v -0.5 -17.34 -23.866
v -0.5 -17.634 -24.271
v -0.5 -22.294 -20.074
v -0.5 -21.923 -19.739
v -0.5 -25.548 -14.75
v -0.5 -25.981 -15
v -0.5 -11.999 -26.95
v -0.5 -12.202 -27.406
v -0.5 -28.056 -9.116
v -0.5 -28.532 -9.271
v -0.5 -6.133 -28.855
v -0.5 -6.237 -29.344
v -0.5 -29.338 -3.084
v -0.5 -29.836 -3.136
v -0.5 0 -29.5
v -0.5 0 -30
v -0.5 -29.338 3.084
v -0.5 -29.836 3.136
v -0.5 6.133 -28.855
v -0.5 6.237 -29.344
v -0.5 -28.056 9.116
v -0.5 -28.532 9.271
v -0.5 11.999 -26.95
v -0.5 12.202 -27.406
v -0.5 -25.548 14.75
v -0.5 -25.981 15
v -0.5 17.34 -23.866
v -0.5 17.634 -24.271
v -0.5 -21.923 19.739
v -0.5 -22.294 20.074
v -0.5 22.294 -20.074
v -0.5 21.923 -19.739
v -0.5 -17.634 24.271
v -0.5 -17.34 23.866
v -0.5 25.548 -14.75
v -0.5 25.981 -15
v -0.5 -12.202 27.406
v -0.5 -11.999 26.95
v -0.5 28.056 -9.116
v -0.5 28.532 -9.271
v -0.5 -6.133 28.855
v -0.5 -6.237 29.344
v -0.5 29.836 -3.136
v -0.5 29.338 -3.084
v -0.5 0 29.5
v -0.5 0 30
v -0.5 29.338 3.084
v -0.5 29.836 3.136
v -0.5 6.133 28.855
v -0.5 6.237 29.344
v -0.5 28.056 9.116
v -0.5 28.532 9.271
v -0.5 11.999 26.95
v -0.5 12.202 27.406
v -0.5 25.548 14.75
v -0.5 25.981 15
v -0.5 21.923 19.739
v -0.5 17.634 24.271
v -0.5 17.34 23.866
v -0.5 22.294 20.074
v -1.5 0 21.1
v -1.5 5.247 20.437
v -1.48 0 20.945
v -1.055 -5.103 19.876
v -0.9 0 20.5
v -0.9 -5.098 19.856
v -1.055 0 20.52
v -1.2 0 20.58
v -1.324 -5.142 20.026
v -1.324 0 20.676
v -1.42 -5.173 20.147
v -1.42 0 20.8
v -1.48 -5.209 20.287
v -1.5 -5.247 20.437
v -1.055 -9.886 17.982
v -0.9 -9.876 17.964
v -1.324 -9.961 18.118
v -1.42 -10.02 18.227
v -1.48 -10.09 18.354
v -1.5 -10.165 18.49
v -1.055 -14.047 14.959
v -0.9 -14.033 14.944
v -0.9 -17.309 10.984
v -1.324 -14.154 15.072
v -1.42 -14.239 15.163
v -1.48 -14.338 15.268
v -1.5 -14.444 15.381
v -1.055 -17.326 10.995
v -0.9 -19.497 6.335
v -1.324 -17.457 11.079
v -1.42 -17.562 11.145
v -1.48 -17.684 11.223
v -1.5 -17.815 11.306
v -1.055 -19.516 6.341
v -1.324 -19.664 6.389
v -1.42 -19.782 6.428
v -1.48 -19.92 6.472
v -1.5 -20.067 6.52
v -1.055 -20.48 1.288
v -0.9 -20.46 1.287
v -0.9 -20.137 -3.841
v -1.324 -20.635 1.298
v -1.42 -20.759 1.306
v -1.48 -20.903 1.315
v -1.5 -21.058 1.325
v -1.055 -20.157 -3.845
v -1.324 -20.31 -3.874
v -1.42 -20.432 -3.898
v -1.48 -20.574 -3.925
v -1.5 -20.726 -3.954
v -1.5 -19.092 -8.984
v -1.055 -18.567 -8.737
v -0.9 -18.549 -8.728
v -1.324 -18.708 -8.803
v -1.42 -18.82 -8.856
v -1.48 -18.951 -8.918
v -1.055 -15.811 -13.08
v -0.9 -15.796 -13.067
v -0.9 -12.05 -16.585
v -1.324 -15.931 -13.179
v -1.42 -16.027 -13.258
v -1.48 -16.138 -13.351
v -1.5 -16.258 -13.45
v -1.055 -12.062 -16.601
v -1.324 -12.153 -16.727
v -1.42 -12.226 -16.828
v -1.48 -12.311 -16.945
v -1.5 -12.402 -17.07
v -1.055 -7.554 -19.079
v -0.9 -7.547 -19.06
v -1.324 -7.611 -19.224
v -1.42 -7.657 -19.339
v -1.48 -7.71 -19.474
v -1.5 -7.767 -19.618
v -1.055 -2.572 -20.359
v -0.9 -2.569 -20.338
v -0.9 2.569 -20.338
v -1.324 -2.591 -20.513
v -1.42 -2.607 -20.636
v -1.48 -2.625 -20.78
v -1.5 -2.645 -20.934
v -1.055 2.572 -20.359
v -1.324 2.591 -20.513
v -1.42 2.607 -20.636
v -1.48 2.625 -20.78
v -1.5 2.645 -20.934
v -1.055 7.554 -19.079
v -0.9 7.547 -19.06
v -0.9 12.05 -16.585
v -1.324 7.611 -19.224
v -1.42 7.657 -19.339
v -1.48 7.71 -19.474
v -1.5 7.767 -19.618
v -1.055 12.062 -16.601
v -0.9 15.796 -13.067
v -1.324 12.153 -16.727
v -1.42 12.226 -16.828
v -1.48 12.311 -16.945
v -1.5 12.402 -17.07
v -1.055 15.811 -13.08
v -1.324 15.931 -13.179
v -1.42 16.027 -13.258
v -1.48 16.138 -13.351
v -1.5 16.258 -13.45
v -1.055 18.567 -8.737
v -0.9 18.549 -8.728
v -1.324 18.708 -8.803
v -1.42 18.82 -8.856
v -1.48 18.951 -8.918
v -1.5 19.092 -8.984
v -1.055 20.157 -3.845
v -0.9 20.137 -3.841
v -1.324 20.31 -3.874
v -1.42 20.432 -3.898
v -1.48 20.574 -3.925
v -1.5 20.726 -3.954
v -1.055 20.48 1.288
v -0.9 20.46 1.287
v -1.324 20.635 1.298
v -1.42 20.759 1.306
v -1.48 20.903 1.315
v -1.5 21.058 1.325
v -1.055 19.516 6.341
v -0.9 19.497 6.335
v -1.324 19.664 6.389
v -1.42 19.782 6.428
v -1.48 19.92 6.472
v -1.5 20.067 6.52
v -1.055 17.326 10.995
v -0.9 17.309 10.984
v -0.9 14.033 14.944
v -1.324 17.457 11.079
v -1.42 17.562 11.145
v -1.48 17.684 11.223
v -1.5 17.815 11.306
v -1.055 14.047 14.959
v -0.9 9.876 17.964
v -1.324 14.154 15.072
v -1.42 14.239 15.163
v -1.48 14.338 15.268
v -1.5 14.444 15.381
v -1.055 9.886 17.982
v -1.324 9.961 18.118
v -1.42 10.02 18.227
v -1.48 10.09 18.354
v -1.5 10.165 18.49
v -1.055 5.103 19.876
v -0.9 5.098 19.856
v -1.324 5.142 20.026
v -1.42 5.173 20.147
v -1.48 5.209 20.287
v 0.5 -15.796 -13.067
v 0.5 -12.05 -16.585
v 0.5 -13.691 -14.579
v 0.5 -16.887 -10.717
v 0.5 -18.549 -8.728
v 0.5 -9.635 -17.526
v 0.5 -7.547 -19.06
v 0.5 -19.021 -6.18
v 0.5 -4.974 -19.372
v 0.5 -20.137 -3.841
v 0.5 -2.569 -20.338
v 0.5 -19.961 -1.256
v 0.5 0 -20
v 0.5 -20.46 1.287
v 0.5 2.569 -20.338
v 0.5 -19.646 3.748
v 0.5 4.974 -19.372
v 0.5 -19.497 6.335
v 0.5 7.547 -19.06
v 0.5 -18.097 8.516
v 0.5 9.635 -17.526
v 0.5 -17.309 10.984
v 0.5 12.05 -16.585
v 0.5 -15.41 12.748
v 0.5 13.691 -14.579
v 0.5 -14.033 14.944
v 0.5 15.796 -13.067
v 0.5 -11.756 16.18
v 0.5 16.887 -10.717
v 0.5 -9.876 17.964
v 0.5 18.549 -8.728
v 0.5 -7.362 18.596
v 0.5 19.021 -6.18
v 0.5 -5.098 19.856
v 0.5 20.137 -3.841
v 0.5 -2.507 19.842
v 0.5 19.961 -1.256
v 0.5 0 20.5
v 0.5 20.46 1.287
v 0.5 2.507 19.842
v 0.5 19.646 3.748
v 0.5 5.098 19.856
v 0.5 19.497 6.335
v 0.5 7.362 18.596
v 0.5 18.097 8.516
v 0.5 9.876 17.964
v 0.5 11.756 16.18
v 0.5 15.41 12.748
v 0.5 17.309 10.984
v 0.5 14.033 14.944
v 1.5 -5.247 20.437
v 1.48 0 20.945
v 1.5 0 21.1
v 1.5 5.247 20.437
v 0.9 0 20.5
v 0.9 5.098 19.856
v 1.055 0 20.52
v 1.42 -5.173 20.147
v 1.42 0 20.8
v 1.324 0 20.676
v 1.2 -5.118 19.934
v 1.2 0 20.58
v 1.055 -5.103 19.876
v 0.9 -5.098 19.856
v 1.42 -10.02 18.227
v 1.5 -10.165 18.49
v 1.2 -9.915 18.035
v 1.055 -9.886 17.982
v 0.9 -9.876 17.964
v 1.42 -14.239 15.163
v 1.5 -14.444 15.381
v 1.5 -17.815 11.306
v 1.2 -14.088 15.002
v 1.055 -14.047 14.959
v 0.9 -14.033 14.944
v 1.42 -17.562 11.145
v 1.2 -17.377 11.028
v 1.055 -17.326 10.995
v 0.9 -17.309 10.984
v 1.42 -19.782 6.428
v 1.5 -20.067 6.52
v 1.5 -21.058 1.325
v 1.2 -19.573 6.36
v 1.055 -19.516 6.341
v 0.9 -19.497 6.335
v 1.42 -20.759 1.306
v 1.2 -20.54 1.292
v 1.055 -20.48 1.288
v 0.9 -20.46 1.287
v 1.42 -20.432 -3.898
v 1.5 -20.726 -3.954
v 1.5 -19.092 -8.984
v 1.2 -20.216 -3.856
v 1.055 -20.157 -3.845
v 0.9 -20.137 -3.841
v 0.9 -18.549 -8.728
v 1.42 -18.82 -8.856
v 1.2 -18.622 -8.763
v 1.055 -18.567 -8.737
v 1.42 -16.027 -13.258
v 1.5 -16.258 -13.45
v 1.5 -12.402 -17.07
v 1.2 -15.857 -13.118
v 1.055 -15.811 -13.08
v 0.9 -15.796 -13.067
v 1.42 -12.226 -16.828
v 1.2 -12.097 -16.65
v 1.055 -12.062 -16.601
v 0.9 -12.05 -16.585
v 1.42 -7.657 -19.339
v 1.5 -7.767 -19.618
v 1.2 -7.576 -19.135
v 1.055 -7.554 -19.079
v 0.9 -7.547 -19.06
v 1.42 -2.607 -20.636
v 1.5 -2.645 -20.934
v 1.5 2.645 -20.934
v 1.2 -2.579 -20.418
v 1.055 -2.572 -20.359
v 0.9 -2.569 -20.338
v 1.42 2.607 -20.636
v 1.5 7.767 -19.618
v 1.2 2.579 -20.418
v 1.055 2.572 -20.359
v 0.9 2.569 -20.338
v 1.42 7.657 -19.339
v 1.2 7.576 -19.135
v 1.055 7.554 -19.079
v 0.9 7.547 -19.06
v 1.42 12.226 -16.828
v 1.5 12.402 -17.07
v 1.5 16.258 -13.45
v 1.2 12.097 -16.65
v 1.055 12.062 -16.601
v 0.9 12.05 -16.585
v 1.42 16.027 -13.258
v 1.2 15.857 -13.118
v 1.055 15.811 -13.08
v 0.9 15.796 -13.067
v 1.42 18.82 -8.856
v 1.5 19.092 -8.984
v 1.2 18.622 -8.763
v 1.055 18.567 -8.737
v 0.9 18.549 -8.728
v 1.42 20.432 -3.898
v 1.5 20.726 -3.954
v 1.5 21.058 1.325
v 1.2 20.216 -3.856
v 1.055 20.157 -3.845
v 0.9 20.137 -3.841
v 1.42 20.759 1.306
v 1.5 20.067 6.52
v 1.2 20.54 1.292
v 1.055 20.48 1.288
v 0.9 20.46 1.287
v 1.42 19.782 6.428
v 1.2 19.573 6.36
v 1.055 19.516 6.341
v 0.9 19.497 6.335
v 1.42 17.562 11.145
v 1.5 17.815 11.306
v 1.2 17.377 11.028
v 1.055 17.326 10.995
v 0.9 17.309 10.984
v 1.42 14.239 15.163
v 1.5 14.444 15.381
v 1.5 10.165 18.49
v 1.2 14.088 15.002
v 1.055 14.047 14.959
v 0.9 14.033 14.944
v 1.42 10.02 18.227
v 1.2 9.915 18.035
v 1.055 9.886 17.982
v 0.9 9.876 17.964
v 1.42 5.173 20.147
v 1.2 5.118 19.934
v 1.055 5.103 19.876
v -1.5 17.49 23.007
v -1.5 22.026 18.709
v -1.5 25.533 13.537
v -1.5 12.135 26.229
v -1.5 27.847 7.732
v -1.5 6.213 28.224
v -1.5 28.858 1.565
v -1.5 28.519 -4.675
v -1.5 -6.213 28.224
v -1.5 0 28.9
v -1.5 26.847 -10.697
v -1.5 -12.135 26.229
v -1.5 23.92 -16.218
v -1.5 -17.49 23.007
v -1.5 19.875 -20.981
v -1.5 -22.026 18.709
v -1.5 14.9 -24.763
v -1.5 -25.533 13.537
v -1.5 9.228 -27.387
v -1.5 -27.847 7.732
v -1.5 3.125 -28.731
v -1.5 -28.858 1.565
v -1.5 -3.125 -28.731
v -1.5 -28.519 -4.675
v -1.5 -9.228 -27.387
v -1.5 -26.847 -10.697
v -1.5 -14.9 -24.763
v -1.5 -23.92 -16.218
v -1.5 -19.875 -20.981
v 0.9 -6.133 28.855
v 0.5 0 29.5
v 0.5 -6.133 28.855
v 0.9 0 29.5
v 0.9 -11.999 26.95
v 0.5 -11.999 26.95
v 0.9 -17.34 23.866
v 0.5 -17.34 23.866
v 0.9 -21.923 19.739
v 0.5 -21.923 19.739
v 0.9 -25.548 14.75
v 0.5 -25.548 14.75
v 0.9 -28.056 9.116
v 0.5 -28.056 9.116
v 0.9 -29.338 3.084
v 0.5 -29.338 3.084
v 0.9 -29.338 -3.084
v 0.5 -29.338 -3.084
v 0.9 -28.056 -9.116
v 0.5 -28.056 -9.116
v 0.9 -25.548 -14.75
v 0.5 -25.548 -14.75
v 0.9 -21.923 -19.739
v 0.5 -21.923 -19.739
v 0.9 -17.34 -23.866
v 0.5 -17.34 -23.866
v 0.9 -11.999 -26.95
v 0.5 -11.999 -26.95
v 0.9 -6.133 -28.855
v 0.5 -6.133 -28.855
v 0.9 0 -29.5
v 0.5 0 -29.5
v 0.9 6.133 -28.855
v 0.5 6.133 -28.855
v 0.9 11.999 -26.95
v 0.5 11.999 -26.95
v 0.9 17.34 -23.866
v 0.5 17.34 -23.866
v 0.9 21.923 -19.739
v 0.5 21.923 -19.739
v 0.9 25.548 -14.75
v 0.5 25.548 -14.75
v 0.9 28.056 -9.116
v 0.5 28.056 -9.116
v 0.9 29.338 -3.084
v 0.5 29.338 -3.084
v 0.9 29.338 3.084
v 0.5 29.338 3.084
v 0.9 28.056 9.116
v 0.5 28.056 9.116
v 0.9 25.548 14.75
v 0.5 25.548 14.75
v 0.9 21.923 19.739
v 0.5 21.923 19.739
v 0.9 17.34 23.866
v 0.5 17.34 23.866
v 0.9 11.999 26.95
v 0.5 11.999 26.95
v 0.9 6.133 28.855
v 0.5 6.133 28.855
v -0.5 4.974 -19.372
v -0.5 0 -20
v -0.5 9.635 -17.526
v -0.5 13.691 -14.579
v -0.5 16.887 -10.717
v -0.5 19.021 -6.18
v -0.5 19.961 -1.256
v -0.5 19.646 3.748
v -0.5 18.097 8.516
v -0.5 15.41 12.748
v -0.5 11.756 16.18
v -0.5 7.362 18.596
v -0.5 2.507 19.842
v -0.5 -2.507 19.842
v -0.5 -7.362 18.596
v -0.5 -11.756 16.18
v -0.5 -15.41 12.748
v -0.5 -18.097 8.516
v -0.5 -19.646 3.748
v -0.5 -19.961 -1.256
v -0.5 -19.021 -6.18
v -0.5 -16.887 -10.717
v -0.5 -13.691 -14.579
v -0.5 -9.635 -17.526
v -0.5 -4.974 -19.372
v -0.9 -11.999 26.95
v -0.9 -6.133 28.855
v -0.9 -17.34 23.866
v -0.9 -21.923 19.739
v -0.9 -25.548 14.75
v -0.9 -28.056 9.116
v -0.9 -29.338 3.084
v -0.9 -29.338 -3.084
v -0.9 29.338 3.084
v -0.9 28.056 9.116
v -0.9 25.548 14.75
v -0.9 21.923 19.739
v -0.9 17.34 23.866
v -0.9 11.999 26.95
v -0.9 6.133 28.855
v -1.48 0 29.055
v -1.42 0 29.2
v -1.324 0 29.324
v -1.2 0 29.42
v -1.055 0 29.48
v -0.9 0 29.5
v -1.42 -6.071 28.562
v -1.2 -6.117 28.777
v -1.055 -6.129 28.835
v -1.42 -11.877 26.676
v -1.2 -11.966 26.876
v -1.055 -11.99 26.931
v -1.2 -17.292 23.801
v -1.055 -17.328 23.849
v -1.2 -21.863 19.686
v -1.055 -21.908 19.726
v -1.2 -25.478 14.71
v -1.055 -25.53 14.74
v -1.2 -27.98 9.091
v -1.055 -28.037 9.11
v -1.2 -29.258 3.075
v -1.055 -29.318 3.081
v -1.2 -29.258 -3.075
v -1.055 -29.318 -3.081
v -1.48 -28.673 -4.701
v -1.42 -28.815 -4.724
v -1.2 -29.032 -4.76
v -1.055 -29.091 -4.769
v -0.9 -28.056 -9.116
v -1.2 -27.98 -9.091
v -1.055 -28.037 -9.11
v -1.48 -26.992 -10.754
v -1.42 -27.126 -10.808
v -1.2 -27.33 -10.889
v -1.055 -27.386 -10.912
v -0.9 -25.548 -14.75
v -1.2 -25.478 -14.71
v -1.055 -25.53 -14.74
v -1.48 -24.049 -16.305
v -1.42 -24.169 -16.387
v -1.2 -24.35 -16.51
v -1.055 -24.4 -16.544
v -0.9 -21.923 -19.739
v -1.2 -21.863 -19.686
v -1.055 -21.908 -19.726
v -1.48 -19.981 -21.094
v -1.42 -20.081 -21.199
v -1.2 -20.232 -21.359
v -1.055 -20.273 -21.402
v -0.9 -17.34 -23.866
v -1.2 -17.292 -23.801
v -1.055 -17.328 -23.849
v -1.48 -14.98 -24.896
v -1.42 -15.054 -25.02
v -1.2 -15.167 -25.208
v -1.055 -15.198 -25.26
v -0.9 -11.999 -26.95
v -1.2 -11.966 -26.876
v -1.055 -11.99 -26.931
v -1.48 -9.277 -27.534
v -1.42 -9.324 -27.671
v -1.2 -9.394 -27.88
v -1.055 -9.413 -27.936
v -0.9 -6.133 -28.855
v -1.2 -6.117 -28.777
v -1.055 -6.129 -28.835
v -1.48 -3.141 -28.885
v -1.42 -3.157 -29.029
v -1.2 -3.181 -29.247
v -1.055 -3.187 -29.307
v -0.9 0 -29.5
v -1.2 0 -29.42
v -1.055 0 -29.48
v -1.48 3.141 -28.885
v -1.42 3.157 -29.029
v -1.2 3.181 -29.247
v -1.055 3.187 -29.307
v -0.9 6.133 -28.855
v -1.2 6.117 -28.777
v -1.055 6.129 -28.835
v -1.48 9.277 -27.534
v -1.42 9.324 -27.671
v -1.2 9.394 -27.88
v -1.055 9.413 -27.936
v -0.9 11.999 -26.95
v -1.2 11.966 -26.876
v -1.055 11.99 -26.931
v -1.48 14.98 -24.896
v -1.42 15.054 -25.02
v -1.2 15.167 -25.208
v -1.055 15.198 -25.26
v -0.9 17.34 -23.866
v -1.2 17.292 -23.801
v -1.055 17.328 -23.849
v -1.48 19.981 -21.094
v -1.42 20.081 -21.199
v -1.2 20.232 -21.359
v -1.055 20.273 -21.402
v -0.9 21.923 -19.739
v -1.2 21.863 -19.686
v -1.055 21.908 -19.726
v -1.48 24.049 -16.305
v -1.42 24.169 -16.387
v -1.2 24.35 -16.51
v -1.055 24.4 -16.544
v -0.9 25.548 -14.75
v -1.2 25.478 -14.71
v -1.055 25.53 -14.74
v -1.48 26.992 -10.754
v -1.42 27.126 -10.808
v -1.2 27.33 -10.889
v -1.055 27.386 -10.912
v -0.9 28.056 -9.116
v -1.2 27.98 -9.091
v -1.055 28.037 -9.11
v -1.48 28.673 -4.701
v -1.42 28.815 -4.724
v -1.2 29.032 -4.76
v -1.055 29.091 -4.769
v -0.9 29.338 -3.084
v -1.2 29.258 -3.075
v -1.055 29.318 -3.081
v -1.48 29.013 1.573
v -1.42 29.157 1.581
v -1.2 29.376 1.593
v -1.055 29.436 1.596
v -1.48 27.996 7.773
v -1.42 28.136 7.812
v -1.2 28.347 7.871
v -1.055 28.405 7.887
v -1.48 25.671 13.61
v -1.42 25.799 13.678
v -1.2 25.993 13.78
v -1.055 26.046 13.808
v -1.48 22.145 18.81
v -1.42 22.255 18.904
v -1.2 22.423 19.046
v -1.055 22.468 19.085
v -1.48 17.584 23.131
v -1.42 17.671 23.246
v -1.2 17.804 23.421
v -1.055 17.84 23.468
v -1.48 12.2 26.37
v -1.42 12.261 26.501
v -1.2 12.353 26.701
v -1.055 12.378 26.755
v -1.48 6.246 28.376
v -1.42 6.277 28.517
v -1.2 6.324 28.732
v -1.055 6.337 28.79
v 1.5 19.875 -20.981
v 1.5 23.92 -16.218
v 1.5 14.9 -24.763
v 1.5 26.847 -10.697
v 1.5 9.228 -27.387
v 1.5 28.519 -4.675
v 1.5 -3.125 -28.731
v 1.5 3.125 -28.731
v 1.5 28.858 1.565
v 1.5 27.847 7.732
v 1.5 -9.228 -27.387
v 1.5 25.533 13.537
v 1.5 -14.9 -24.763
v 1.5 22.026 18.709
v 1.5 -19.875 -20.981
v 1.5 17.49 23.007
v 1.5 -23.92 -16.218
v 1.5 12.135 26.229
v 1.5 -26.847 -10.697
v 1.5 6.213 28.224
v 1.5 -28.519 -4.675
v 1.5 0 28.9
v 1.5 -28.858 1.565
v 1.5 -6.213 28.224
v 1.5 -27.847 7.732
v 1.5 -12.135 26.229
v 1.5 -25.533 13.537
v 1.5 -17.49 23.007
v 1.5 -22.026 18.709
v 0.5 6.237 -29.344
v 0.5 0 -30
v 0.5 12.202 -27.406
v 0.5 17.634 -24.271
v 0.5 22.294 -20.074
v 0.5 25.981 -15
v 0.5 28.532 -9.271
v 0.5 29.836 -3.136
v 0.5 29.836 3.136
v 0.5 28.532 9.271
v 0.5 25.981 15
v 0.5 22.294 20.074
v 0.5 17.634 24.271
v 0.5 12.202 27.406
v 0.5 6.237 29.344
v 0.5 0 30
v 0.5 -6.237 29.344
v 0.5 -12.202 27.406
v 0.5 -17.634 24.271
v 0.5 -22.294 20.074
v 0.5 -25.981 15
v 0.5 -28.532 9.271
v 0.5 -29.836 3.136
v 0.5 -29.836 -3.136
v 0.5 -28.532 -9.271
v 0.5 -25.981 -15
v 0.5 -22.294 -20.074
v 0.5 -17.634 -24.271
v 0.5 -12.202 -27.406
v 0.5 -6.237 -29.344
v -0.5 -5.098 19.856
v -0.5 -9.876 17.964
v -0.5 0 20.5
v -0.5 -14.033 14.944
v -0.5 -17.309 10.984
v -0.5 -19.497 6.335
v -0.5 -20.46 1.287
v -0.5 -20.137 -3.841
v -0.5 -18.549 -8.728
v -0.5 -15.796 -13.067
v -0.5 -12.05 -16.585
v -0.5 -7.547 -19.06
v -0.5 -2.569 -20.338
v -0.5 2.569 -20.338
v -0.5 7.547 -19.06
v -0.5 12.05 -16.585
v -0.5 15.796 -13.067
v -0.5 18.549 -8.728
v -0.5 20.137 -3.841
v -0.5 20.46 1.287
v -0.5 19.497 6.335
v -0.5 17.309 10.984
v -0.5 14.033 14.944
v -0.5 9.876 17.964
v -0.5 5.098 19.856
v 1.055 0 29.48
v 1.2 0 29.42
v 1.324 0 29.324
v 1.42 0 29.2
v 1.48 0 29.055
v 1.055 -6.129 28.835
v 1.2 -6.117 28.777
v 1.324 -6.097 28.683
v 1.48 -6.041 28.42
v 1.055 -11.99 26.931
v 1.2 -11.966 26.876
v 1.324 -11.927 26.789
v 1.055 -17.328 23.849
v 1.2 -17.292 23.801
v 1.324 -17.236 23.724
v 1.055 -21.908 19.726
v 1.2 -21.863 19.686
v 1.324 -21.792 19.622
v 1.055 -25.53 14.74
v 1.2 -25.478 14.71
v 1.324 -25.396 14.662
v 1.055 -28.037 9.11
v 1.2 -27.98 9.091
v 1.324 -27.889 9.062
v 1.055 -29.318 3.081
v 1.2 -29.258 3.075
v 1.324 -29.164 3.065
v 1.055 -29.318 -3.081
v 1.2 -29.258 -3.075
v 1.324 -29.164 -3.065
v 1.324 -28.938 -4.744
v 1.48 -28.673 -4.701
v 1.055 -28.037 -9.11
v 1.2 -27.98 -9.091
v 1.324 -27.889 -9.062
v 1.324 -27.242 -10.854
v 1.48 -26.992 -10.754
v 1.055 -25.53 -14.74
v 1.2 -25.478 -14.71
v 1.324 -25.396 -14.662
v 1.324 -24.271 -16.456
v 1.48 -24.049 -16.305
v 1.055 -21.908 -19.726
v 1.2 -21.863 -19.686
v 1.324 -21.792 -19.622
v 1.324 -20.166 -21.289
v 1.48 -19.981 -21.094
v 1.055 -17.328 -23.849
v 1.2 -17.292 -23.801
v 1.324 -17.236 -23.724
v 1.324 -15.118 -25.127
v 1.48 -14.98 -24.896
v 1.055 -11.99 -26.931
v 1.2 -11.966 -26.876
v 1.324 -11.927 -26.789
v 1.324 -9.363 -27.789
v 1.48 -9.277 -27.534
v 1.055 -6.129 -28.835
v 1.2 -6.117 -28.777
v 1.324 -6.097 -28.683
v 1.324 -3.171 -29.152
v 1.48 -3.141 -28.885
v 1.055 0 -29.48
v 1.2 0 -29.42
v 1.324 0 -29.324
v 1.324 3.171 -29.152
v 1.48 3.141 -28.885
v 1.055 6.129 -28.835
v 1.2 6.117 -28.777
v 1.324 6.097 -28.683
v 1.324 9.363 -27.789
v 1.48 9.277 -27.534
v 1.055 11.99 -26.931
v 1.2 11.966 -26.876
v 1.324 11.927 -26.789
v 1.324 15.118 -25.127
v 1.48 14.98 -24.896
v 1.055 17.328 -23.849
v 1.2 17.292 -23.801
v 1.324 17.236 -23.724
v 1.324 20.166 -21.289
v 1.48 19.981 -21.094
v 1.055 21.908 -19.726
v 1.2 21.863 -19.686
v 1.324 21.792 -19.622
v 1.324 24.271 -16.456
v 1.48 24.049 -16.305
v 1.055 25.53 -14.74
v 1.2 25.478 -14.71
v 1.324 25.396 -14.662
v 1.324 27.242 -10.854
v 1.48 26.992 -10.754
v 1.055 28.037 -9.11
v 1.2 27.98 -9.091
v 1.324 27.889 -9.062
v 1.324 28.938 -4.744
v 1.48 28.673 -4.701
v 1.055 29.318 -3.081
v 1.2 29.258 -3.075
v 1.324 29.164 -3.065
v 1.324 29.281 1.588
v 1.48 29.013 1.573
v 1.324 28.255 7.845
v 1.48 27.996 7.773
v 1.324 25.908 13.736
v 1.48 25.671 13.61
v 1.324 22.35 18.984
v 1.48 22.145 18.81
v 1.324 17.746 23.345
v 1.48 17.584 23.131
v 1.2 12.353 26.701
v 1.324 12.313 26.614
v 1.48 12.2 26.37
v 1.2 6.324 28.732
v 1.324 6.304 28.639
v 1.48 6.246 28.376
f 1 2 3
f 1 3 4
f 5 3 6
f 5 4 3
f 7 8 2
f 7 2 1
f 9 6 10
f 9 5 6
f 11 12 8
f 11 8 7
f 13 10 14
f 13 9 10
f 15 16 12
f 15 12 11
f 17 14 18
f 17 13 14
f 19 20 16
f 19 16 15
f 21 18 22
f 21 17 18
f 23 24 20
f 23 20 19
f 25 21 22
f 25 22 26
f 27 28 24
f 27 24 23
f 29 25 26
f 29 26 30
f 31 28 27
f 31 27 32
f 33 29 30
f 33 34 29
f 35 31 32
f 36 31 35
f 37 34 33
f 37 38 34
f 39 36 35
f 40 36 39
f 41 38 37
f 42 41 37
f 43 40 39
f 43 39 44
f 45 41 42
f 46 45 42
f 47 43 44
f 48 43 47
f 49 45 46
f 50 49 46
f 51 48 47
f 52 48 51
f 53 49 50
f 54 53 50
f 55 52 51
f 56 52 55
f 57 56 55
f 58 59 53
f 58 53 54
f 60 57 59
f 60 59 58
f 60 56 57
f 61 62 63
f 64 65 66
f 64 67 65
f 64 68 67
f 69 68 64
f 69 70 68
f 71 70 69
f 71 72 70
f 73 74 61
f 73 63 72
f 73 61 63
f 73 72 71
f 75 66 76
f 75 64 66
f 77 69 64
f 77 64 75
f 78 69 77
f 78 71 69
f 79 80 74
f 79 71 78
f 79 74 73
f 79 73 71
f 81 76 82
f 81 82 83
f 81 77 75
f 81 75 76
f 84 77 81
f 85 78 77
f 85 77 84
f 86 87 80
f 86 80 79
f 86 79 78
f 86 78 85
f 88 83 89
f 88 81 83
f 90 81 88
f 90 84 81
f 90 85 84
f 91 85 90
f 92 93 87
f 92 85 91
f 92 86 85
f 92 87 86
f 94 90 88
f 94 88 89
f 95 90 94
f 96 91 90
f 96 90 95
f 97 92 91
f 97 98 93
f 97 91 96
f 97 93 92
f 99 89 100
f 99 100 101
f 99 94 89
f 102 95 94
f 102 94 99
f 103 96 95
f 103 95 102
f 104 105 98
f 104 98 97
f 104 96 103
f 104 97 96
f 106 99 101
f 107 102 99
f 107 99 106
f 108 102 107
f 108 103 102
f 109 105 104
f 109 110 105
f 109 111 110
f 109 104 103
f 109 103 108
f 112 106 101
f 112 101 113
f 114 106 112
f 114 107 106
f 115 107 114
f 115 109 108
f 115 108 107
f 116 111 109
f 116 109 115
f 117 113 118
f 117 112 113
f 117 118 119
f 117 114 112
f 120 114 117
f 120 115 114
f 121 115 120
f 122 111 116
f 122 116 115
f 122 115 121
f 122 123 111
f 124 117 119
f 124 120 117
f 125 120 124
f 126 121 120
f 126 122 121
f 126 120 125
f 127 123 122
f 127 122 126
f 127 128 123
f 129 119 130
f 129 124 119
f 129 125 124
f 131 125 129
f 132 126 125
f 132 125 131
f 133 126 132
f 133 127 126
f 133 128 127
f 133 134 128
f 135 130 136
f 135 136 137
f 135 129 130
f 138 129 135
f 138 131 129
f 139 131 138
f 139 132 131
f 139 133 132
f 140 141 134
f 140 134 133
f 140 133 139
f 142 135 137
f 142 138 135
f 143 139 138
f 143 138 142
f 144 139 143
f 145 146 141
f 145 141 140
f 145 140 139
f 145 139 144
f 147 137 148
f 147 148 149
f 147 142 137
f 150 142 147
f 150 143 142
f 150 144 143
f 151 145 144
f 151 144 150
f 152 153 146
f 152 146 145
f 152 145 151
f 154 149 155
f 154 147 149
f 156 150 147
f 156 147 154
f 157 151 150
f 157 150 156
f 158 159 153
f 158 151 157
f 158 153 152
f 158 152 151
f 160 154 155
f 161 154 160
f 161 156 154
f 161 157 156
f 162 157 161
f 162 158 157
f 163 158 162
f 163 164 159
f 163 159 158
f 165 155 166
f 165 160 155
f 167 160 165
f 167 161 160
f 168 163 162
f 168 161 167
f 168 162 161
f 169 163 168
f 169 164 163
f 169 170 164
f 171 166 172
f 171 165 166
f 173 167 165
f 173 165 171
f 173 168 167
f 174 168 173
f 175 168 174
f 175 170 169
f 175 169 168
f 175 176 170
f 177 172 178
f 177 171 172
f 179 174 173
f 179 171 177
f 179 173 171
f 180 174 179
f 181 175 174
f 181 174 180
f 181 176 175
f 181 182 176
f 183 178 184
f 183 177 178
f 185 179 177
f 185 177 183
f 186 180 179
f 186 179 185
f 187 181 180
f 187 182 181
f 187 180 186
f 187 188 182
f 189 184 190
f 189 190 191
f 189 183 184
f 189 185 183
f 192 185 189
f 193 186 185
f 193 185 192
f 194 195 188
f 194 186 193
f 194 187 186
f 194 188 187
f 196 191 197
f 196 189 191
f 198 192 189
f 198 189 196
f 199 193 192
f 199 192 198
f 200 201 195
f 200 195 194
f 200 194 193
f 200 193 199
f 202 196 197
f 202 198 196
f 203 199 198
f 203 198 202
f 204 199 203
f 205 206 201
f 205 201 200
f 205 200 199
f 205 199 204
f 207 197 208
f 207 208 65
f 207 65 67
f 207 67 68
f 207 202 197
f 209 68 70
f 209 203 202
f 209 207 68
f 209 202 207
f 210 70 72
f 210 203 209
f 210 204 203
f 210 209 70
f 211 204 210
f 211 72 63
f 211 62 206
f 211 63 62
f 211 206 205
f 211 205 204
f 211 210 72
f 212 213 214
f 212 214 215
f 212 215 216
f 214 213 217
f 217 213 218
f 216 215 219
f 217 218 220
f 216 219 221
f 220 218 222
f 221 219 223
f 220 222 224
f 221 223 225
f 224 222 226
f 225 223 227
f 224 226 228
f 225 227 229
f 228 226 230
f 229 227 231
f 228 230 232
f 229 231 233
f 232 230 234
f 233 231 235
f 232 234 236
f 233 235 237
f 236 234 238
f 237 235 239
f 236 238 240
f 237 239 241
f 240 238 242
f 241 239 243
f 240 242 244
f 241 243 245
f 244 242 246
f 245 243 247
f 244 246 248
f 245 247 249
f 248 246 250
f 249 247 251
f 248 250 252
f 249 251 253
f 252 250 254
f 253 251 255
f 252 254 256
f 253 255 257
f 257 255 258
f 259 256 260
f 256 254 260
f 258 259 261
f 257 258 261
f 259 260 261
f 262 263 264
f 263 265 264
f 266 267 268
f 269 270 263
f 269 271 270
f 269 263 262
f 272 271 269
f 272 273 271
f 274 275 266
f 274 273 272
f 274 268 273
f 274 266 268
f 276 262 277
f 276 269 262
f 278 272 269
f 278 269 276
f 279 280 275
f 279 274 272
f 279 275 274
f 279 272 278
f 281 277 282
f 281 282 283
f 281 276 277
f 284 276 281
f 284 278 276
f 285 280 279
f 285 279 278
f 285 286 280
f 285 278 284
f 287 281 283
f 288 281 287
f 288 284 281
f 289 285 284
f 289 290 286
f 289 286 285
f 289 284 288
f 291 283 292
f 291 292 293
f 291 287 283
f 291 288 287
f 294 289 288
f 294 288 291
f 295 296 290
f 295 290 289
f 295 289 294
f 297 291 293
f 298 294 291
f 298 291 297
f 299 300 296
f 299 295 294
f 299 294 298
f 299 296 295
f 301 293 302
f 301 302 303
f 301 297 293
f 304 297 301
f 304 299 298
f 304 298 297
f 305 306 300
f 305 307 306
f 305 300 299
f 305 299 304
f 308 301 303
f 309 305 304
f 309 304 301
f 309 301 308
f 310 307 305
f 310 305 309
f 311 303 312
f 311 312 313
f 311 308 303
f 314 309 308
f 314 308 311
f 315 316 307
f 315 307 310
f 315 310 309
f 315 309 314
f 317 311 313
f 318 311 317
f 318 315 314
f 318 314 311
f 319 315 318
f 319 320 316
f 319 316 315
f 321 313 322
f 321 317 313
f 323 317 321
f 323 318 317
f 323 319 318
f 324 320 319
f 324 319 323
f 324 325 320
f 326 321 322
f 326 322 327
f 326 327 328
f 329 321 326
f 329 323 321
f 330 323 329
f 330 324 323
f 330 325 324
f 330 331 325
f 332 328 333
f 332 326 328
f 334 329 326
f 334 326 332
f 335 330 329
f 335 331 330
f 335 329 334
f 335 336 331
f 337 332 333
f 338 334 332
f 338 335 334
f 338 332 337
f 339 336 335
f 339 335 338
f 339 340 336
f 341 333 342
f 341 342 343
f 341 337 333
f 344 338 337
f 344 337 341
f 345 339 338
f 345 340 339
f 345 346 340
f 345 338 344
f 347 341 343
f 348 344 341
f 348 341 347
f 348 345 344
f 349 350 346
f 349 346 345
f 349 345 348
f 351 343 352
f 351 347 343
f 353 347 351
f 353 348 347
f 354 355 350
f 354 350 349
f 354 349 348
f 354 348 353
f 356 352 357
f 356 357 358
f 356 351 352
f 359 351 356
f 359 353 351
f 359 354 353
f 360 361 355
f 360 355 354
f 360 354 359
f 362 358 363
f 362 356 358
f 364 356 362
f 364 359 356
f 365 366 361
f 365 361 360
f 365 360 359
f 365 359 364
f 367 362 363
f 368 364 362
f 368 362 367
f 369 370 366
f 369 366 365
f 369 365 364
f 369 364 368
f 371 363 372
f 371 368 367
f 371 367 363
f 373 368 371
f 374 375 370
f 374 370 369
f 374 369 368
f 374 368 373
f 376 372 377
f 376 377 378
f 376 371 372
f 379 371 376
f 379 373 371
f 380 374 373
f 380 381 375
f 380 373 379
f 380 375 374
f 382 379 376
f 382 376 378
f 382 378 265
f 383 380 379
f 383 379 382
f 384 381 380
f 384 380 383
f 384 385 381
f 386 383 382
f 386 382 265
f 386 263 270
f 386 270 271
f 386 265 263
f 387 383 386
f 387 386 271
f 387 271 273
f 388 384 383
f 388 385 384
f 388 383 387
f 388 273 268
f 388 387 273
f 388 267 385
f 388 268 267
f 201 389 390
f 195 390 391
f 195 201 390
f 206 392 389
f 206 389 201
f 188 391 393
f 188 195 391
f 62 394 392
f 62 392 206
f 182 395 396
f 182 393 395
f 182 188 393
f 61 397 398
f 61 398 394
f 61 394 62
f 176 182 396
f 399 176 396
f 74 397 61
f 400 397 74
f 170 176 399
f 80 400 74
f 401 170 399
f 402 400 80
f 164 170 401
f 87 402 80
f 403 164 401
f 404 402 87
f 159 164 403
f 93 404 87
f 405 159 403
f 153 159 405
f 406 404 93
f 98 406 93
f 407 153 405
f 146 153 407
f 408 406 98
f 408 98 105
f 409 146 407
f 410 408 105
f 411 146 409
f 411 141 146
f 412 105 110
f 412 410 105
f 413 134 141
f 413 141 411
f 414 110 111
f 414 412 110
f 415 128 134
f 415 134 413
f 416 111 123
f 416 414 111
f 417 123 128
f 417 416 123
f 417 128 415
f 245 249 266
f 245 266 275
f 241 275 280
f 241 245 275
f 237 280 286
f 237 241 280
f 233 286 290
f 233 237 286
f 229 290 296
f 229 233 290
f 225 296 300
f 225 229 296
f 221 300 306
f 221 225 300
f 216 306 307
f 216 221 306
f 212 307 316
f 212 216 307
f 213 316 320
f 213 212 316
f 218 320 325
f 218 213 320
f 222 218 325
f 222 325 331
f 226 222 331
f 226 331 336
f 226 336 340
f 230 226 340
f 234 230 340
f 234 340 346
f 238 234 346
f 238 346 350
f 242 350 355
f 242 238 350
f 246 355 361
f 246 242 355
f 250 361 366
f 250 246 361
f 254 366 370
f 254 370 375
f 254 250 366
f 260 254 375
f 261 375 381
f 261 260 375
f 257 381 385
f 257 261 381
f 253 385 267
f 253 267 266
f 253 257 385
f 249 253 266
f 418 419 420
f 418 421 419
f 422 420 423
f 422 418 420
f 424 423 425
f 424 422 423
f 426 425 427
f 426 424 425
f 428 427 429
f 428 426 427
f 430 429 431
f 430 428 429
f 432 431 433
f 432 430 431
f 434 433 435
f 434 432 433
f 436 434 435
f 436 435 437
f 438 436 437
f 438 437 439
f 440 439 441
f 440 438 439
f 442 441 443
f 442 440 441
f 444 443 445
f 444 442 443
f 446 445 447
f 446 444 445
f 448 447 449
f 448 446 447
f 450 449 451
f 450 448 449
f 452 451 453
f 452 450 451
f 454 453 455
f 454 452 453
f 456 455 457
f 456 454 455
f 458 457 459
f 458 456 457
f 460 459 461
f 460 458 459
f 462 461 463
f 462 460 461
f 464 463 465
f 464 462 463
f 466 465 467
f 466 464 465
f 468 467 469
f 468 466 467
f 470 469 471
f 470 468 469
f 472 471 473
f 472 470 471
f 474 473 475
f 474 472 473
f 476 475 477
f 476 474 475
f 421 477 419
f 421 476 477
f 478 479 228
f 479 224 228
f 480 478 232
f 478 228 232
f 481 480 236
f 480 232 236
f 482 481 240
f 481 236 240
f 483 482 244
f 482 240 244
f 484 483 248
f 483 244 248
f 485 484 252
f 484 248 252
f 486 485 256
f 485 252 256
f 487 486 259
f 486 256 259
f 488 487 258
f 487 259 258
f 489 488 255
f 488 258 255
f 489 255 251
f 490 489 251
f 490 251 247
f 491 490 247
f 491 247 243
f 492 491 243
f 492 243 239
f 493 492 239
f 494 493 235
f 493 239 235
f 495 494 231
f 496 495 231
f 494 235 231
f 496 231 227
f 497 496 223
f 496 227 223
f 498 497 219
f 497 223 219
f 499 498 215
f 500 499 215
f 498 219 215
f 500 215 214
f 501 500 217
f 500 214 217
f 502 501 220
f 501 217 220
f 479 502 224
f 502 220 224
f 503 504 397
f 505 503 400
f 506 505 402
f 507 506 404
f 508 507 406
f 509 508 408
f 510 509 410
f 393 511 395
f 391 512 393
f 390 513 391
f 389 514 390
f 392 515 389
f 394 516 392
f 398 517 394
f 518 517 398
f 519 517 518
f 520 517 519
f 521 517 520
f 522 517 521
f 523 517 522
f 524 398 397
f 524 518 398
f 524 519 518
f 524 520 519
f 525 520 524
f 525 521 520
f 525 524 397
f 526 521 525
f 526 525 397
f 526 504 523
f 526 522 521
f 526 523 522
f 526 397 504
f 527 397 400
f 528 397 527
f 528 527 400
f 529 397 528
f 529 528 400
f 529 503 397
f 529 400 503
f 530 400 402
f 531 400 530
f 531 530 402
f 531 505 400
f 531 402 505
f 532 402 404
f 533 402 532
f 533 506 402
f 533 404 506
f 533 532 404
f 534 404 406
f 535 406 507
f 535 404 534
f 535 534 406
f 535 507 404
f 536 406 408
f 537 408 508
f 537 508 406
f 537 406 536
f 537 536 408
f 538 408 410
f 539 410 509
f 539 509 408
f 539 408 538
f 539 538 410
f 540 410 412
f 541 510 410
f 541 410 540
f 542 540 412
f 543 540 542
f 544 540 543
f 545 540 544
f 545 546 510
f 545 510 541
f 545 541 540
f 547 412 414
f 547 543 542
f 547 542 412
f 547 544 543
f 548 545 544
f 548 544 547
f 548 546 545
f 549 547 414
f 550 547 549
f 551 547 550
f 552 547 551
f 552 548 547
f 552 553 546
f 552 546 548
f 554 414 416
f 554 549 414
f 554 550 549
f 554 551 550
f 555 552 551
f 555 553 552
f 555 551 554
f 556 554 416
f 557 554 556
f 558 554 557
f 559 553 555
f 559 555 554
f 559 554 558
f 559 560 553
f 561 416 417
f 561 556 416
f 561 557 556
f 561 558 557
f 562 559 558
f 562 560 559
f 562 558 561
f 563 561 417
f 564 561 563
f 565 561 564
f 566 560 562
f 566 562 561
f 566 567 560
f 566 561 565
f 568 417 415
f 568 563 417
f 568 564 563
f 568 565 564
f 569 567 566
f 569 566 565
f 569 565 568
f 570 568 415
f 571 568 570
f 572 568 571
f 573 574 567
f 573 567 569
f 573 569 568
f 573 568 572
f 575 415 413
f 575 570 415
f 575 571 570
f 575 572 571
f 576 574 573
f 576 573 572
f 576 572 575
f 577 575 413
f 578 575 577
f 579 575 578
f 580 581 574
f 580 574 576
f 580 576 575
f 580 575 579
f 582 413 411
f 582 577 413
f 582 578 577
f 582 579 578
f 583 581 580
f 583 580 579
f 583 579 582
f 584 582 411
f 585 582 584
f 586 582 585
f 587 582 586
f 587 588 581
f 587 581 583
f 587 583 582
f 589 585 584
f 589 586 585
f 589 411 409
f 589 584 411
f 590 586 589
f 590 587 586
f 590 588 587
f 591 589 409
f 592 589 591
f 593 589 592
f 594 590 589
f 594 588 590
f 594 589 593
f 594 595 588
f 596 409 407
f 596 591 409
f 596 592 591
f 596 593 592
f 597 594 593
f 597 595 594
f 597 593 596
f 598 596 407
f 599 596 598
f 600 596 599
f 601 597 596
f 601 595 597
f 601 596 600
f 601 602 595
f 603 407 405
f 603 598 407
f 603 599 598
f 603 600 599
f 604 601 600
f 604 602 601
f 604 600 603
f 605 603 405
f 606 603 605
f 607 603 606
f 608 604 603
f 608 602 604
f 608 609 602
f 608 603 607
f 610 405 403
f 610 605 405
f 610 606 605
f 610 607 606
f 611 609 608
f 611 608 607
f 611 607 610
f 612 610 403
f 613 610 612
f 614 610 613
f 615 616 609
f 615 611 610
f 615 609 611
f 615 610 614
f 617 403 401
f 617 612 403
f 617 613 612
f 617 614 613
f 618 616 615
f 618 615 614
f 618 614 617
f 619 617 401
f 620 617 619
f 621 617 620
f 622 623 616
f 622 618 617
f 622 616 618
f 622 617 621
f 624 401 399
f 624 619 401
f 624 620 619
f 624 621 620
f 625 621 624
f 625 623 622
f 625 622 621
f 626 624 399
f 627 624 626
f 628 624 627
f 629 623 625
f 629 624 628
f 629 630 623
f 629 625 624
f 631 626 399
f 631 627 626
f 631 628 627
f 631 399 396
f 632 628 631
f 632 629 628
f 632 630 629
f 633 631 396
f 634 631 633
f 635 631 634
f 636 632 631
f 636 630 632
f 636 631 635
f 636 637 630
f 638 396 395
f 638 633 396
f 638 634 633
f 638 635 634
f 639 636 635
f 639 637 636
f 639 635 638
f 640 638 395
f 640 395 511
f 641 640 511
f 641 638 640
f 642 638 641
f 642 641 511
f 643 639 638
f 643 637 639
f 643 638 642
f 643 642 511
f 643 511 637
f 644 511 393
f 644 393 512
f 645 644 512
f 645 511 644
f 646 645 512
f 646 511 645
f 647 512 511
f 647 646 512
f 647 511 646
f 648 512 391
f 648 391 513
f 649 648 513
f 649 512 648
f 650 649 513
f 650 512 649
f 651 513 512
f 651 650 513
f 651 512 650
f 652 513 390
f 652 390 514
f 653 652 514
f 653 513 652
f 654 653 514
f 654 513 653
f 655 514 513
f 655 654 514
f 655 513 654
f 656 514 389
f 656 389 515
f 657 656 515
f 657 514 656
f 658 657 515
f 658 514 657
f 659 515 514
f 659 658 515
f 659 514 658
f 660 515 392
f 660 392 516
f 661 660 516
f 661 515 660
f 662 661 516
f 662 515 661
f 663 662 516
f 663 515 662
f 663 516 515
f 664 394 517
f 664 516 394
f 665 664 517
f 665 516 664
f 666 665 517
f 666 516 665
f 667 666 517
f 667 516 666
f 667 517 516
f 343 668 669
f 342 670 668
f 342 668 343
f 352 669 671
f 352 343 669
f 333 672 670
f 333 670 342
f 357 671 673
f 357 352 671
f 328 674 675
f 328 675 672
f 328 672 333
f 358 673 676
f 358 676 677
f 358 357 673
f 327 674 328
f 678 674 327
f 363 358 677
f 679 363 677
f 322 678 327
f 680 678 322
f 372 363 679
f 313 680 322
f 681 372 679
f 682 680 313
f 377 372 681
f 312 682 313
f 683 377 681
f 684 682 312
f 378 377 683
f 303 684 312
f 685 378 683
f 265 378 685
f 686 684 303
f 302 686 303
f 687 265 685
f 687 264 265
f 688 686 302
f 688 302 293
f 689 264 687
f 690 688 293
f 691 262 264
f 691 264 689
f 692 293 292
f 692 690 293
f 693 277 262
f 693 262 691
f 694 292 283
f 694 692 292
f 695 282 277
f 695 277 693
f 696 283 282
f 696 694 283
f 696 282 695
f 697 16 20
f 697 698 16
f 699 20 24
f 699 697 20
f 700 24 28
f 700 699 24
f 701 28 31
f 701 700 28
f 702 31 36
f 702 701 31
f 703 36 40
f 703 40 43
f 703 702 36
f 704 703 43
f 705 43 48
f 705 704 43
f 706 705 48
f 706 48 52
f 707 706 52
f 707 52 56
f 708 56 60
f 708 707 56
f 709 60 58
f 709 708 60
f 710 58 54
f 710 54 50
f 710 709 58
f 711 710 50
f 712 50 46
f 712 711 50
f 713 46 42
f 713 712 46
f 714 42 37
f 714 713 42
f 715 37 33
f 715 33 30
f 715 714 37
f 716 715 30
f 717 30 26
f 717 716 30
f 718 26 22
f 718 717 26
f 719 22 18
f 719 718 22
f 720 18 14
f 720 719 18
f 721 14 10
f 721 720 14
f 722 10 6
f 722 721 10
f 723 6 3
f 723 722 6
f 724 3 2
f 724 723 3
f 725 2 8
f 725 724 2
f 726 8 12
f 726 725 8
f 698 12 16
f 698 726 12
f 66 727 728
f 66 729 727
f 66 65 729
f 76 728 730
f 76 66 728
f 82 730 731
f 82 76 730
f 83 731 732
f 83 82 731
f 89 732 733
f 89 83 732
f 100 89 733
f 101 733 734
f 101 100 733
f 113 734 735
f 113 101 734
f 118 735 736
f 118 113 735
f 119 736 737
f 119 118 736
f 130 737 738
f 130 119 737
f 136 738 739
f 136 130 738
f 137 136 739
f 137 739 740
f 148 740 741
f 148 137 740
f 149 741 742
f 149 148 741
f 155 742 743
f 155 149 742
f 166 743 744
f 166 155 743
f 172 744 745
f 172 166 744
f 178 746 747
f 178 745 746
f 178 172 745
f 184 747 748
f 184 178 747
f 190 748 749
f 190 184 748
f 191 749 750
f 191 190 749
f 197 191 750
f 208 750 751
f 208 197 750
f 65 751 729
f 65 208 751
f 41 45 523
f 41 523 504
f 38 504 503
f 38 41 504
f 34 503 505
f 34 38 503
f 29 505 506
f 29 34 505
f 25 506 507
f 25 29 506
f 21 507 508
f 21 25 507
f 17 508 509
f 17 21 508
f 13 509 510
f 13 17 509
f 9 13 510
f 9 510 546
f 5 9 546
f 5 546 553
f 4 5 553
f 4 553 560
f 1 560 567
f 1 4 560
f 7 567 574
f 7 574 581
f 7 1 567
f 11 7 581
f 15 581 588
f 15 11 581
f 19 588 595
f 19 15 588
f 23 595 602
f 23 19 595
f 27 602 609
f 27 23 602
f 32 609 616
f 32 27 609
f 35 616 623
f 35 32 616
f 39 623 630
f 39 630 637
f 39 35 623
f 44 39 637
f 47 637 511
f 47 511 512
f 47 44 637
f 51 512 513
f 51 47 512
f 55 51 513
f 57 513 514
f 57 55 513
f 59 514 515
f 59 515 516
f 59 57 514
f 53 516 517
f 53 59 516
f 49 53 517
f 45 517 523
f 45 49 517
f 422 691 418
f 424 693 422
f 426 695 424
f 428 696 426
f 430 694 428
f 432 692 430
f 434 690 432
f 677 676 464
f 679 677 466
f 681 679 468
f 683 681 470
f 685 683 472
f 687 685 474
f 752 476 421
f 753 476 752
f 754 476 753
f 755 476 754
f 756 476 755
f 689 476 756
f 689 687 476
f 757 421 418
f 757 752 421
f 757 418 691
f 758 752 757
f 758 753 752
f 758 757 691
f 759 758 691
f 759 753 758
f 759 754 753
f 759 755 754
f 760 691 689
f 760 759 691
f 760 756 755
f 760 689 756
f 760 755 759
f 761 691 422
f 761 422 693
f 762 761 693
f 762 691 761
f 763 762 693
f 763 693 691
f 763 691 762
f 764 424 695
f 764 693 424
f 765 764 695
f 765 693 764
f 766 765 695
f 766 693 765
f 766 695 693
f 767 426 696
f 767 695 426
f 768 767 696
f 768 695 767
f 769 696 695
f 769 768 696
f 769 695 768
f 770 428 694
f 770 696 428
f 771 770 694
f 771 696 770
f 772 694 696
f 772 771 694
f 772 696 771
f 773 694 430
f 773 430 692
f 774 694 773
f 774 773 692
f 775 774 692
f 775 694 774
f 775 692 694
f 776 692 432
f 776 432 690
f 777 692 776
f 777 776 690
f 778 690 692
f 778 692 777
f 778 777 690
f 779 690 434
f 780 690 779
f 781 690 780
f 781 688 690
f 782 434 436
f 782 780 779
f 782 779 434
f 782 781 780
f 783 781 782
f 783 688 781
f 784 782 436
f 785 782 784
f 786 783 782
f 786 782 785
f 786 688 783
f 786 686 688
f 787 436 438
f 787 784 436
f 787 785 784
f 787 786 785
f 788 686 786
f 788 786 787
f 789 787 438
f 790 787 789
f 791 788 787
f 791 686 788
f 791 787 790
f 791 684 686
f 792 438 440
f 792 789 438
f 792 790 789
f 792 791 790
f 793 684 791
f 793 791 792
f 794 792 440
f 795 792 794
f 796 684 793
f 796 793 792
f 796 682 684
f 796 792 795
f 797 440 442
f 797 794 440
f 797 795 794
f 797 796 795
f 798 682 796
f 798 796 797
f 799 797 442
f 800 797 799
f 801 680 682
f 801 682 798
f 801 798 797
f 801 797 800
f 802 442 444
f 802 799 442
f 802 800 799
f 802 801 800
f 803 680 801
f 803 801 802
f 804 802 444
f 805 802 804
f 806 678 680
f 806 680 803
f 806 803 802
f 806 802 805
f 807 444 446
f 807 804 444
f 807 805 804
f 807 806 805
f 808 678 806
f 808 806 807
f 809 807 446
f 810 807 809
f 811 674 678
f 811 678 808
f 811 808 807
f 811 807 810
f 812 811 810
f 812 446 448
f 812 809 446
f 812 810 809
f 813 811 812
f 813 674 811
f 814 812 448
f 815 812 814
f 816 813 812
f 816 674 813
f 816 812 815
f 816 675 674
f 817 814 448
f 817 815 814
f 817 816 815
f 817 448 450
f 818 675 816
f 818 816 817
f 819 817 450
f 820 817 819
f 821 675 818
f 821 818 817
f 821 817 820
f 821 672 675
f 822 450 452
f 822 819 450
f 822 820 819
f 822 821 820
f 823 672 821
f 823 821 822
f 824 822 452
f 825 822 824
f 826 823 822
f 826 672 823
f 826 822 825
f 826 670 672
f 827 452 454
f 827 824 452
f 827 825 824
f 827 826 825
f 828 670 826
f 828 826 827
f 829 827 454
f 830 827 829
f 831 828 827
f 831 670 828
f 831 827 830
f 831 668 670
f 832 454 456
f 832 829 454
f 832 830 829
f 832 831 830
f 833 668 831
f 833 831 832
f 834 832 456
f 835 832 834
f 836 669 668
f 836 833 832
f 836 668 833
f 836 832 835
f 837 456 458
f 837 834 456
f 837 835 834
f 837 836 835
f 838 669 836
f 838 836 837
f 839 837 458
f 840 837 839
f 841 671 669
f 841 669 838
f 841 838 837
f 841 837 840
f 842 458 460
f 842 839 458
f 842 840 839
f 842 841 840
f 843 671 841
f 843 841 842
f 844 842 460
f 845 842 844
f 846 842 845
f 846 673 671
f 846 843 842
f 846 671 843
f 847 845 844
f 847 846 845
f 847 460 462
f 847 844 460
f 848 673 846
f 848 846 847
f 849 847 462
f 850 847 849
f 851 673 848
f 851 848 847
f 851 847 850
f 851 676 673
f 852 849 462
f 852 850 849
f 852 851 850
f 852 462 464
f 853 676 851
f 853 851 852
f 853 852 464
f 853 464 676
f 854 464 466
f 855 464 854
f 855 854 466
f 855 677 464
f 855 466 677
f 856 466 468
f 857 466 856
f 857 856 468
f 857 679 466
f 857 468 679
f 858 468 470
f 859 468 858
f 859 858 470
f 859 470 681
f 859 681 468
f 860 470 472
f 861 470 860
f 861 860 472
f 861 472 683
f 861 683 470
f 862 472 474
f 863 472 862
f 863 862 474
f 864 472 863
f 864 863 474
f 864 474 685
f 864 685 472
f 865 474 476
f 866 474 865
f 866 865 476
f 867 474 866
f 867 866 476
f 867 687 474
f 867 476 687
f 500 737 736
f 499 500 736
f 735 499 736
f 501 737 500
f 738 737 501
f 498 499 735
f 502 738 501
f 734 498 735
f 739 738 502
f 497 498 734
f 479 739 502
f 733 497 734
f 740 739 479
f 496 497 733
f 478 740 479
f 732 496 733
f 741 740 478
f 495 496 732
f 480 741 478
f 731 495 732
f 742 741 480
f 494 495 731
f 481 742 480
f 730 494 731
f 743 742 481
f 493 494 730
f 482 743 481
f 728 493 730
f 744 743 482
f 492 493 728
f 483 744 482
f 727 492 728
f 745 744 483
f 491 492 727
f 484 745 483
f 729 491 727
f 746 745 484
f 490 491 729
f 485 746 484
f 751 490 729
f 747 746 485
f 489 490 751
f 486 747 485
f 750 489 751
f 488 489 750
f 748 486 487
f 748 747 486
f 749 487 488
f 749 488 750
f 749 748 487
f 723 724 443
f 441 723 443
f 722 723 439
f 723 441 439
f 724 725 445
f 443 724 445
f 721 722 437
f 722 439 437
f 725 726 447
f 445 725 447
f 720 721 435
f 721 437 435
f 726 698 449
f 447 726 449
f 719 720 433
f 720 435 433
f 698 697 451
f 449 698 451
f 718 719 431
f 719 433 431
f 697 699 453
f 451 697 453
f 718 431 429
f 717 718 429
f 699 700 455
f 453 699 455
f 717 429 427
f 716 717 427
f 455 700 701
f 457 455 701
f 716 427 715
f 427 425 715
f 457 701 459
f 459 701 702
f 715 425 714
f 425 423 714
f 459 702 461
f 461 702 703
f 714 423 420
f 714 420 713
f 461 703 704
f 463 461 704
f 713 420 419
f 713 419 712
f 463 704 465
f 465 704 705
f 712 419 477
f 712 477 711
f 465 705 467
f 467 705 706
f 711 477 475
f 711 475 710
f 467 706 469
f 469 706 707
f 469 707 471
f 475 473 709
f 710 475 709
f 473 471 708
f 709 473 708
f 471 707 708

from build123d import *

# Parameters (mm, degrees)
CAGSPISKE_W = 1
CAGSPISKE_H = 10


with BuildPart() as part:
    # CagSpiSke → CageSpine (revolve)
    with BuildSketch(Plane.XY):
        with Locations((0, 25)):
            Rectangle(CAGSPISKE_W, CAGSPISKE_H)
    revolve(axis=Axis((-34.925, 0, 0), (1, 0, 0)))

    # RolSimSke → RollersSimplified (revolve)
    with BuildSketch(Plane.XY):
        with BuildLine():
            Line((-0.9, 29.5), (0.9, 29.5))
            ThreePointArc((0.9, 29.5), (1.324264069, 29.324264069), (1.5, 28.9))
            Line((1.5, 28.9), (1.5, 21.1))
            ThreePointArc((1.5, 21.1), (1.324264069, 20.675735931), (0.9, 20.5))
            Line((0.9, 20.5), (-0.9, 20.5))
            ThreePointArc((-0.9, 20.5), (-1.324264069, 20.675735931), (-1.5, 21.1))
            Line((-1.5, 21.1), (-1.5, 28.9))
            ThreePointArc((-1.5, 28.9), (-1.324264069, 29.324264069), (-0.9, 29.5))
        make_face()
    revolve(axis=Axis((-17.78, 0, 0), (1, 0, 0)))


solid = part.part
